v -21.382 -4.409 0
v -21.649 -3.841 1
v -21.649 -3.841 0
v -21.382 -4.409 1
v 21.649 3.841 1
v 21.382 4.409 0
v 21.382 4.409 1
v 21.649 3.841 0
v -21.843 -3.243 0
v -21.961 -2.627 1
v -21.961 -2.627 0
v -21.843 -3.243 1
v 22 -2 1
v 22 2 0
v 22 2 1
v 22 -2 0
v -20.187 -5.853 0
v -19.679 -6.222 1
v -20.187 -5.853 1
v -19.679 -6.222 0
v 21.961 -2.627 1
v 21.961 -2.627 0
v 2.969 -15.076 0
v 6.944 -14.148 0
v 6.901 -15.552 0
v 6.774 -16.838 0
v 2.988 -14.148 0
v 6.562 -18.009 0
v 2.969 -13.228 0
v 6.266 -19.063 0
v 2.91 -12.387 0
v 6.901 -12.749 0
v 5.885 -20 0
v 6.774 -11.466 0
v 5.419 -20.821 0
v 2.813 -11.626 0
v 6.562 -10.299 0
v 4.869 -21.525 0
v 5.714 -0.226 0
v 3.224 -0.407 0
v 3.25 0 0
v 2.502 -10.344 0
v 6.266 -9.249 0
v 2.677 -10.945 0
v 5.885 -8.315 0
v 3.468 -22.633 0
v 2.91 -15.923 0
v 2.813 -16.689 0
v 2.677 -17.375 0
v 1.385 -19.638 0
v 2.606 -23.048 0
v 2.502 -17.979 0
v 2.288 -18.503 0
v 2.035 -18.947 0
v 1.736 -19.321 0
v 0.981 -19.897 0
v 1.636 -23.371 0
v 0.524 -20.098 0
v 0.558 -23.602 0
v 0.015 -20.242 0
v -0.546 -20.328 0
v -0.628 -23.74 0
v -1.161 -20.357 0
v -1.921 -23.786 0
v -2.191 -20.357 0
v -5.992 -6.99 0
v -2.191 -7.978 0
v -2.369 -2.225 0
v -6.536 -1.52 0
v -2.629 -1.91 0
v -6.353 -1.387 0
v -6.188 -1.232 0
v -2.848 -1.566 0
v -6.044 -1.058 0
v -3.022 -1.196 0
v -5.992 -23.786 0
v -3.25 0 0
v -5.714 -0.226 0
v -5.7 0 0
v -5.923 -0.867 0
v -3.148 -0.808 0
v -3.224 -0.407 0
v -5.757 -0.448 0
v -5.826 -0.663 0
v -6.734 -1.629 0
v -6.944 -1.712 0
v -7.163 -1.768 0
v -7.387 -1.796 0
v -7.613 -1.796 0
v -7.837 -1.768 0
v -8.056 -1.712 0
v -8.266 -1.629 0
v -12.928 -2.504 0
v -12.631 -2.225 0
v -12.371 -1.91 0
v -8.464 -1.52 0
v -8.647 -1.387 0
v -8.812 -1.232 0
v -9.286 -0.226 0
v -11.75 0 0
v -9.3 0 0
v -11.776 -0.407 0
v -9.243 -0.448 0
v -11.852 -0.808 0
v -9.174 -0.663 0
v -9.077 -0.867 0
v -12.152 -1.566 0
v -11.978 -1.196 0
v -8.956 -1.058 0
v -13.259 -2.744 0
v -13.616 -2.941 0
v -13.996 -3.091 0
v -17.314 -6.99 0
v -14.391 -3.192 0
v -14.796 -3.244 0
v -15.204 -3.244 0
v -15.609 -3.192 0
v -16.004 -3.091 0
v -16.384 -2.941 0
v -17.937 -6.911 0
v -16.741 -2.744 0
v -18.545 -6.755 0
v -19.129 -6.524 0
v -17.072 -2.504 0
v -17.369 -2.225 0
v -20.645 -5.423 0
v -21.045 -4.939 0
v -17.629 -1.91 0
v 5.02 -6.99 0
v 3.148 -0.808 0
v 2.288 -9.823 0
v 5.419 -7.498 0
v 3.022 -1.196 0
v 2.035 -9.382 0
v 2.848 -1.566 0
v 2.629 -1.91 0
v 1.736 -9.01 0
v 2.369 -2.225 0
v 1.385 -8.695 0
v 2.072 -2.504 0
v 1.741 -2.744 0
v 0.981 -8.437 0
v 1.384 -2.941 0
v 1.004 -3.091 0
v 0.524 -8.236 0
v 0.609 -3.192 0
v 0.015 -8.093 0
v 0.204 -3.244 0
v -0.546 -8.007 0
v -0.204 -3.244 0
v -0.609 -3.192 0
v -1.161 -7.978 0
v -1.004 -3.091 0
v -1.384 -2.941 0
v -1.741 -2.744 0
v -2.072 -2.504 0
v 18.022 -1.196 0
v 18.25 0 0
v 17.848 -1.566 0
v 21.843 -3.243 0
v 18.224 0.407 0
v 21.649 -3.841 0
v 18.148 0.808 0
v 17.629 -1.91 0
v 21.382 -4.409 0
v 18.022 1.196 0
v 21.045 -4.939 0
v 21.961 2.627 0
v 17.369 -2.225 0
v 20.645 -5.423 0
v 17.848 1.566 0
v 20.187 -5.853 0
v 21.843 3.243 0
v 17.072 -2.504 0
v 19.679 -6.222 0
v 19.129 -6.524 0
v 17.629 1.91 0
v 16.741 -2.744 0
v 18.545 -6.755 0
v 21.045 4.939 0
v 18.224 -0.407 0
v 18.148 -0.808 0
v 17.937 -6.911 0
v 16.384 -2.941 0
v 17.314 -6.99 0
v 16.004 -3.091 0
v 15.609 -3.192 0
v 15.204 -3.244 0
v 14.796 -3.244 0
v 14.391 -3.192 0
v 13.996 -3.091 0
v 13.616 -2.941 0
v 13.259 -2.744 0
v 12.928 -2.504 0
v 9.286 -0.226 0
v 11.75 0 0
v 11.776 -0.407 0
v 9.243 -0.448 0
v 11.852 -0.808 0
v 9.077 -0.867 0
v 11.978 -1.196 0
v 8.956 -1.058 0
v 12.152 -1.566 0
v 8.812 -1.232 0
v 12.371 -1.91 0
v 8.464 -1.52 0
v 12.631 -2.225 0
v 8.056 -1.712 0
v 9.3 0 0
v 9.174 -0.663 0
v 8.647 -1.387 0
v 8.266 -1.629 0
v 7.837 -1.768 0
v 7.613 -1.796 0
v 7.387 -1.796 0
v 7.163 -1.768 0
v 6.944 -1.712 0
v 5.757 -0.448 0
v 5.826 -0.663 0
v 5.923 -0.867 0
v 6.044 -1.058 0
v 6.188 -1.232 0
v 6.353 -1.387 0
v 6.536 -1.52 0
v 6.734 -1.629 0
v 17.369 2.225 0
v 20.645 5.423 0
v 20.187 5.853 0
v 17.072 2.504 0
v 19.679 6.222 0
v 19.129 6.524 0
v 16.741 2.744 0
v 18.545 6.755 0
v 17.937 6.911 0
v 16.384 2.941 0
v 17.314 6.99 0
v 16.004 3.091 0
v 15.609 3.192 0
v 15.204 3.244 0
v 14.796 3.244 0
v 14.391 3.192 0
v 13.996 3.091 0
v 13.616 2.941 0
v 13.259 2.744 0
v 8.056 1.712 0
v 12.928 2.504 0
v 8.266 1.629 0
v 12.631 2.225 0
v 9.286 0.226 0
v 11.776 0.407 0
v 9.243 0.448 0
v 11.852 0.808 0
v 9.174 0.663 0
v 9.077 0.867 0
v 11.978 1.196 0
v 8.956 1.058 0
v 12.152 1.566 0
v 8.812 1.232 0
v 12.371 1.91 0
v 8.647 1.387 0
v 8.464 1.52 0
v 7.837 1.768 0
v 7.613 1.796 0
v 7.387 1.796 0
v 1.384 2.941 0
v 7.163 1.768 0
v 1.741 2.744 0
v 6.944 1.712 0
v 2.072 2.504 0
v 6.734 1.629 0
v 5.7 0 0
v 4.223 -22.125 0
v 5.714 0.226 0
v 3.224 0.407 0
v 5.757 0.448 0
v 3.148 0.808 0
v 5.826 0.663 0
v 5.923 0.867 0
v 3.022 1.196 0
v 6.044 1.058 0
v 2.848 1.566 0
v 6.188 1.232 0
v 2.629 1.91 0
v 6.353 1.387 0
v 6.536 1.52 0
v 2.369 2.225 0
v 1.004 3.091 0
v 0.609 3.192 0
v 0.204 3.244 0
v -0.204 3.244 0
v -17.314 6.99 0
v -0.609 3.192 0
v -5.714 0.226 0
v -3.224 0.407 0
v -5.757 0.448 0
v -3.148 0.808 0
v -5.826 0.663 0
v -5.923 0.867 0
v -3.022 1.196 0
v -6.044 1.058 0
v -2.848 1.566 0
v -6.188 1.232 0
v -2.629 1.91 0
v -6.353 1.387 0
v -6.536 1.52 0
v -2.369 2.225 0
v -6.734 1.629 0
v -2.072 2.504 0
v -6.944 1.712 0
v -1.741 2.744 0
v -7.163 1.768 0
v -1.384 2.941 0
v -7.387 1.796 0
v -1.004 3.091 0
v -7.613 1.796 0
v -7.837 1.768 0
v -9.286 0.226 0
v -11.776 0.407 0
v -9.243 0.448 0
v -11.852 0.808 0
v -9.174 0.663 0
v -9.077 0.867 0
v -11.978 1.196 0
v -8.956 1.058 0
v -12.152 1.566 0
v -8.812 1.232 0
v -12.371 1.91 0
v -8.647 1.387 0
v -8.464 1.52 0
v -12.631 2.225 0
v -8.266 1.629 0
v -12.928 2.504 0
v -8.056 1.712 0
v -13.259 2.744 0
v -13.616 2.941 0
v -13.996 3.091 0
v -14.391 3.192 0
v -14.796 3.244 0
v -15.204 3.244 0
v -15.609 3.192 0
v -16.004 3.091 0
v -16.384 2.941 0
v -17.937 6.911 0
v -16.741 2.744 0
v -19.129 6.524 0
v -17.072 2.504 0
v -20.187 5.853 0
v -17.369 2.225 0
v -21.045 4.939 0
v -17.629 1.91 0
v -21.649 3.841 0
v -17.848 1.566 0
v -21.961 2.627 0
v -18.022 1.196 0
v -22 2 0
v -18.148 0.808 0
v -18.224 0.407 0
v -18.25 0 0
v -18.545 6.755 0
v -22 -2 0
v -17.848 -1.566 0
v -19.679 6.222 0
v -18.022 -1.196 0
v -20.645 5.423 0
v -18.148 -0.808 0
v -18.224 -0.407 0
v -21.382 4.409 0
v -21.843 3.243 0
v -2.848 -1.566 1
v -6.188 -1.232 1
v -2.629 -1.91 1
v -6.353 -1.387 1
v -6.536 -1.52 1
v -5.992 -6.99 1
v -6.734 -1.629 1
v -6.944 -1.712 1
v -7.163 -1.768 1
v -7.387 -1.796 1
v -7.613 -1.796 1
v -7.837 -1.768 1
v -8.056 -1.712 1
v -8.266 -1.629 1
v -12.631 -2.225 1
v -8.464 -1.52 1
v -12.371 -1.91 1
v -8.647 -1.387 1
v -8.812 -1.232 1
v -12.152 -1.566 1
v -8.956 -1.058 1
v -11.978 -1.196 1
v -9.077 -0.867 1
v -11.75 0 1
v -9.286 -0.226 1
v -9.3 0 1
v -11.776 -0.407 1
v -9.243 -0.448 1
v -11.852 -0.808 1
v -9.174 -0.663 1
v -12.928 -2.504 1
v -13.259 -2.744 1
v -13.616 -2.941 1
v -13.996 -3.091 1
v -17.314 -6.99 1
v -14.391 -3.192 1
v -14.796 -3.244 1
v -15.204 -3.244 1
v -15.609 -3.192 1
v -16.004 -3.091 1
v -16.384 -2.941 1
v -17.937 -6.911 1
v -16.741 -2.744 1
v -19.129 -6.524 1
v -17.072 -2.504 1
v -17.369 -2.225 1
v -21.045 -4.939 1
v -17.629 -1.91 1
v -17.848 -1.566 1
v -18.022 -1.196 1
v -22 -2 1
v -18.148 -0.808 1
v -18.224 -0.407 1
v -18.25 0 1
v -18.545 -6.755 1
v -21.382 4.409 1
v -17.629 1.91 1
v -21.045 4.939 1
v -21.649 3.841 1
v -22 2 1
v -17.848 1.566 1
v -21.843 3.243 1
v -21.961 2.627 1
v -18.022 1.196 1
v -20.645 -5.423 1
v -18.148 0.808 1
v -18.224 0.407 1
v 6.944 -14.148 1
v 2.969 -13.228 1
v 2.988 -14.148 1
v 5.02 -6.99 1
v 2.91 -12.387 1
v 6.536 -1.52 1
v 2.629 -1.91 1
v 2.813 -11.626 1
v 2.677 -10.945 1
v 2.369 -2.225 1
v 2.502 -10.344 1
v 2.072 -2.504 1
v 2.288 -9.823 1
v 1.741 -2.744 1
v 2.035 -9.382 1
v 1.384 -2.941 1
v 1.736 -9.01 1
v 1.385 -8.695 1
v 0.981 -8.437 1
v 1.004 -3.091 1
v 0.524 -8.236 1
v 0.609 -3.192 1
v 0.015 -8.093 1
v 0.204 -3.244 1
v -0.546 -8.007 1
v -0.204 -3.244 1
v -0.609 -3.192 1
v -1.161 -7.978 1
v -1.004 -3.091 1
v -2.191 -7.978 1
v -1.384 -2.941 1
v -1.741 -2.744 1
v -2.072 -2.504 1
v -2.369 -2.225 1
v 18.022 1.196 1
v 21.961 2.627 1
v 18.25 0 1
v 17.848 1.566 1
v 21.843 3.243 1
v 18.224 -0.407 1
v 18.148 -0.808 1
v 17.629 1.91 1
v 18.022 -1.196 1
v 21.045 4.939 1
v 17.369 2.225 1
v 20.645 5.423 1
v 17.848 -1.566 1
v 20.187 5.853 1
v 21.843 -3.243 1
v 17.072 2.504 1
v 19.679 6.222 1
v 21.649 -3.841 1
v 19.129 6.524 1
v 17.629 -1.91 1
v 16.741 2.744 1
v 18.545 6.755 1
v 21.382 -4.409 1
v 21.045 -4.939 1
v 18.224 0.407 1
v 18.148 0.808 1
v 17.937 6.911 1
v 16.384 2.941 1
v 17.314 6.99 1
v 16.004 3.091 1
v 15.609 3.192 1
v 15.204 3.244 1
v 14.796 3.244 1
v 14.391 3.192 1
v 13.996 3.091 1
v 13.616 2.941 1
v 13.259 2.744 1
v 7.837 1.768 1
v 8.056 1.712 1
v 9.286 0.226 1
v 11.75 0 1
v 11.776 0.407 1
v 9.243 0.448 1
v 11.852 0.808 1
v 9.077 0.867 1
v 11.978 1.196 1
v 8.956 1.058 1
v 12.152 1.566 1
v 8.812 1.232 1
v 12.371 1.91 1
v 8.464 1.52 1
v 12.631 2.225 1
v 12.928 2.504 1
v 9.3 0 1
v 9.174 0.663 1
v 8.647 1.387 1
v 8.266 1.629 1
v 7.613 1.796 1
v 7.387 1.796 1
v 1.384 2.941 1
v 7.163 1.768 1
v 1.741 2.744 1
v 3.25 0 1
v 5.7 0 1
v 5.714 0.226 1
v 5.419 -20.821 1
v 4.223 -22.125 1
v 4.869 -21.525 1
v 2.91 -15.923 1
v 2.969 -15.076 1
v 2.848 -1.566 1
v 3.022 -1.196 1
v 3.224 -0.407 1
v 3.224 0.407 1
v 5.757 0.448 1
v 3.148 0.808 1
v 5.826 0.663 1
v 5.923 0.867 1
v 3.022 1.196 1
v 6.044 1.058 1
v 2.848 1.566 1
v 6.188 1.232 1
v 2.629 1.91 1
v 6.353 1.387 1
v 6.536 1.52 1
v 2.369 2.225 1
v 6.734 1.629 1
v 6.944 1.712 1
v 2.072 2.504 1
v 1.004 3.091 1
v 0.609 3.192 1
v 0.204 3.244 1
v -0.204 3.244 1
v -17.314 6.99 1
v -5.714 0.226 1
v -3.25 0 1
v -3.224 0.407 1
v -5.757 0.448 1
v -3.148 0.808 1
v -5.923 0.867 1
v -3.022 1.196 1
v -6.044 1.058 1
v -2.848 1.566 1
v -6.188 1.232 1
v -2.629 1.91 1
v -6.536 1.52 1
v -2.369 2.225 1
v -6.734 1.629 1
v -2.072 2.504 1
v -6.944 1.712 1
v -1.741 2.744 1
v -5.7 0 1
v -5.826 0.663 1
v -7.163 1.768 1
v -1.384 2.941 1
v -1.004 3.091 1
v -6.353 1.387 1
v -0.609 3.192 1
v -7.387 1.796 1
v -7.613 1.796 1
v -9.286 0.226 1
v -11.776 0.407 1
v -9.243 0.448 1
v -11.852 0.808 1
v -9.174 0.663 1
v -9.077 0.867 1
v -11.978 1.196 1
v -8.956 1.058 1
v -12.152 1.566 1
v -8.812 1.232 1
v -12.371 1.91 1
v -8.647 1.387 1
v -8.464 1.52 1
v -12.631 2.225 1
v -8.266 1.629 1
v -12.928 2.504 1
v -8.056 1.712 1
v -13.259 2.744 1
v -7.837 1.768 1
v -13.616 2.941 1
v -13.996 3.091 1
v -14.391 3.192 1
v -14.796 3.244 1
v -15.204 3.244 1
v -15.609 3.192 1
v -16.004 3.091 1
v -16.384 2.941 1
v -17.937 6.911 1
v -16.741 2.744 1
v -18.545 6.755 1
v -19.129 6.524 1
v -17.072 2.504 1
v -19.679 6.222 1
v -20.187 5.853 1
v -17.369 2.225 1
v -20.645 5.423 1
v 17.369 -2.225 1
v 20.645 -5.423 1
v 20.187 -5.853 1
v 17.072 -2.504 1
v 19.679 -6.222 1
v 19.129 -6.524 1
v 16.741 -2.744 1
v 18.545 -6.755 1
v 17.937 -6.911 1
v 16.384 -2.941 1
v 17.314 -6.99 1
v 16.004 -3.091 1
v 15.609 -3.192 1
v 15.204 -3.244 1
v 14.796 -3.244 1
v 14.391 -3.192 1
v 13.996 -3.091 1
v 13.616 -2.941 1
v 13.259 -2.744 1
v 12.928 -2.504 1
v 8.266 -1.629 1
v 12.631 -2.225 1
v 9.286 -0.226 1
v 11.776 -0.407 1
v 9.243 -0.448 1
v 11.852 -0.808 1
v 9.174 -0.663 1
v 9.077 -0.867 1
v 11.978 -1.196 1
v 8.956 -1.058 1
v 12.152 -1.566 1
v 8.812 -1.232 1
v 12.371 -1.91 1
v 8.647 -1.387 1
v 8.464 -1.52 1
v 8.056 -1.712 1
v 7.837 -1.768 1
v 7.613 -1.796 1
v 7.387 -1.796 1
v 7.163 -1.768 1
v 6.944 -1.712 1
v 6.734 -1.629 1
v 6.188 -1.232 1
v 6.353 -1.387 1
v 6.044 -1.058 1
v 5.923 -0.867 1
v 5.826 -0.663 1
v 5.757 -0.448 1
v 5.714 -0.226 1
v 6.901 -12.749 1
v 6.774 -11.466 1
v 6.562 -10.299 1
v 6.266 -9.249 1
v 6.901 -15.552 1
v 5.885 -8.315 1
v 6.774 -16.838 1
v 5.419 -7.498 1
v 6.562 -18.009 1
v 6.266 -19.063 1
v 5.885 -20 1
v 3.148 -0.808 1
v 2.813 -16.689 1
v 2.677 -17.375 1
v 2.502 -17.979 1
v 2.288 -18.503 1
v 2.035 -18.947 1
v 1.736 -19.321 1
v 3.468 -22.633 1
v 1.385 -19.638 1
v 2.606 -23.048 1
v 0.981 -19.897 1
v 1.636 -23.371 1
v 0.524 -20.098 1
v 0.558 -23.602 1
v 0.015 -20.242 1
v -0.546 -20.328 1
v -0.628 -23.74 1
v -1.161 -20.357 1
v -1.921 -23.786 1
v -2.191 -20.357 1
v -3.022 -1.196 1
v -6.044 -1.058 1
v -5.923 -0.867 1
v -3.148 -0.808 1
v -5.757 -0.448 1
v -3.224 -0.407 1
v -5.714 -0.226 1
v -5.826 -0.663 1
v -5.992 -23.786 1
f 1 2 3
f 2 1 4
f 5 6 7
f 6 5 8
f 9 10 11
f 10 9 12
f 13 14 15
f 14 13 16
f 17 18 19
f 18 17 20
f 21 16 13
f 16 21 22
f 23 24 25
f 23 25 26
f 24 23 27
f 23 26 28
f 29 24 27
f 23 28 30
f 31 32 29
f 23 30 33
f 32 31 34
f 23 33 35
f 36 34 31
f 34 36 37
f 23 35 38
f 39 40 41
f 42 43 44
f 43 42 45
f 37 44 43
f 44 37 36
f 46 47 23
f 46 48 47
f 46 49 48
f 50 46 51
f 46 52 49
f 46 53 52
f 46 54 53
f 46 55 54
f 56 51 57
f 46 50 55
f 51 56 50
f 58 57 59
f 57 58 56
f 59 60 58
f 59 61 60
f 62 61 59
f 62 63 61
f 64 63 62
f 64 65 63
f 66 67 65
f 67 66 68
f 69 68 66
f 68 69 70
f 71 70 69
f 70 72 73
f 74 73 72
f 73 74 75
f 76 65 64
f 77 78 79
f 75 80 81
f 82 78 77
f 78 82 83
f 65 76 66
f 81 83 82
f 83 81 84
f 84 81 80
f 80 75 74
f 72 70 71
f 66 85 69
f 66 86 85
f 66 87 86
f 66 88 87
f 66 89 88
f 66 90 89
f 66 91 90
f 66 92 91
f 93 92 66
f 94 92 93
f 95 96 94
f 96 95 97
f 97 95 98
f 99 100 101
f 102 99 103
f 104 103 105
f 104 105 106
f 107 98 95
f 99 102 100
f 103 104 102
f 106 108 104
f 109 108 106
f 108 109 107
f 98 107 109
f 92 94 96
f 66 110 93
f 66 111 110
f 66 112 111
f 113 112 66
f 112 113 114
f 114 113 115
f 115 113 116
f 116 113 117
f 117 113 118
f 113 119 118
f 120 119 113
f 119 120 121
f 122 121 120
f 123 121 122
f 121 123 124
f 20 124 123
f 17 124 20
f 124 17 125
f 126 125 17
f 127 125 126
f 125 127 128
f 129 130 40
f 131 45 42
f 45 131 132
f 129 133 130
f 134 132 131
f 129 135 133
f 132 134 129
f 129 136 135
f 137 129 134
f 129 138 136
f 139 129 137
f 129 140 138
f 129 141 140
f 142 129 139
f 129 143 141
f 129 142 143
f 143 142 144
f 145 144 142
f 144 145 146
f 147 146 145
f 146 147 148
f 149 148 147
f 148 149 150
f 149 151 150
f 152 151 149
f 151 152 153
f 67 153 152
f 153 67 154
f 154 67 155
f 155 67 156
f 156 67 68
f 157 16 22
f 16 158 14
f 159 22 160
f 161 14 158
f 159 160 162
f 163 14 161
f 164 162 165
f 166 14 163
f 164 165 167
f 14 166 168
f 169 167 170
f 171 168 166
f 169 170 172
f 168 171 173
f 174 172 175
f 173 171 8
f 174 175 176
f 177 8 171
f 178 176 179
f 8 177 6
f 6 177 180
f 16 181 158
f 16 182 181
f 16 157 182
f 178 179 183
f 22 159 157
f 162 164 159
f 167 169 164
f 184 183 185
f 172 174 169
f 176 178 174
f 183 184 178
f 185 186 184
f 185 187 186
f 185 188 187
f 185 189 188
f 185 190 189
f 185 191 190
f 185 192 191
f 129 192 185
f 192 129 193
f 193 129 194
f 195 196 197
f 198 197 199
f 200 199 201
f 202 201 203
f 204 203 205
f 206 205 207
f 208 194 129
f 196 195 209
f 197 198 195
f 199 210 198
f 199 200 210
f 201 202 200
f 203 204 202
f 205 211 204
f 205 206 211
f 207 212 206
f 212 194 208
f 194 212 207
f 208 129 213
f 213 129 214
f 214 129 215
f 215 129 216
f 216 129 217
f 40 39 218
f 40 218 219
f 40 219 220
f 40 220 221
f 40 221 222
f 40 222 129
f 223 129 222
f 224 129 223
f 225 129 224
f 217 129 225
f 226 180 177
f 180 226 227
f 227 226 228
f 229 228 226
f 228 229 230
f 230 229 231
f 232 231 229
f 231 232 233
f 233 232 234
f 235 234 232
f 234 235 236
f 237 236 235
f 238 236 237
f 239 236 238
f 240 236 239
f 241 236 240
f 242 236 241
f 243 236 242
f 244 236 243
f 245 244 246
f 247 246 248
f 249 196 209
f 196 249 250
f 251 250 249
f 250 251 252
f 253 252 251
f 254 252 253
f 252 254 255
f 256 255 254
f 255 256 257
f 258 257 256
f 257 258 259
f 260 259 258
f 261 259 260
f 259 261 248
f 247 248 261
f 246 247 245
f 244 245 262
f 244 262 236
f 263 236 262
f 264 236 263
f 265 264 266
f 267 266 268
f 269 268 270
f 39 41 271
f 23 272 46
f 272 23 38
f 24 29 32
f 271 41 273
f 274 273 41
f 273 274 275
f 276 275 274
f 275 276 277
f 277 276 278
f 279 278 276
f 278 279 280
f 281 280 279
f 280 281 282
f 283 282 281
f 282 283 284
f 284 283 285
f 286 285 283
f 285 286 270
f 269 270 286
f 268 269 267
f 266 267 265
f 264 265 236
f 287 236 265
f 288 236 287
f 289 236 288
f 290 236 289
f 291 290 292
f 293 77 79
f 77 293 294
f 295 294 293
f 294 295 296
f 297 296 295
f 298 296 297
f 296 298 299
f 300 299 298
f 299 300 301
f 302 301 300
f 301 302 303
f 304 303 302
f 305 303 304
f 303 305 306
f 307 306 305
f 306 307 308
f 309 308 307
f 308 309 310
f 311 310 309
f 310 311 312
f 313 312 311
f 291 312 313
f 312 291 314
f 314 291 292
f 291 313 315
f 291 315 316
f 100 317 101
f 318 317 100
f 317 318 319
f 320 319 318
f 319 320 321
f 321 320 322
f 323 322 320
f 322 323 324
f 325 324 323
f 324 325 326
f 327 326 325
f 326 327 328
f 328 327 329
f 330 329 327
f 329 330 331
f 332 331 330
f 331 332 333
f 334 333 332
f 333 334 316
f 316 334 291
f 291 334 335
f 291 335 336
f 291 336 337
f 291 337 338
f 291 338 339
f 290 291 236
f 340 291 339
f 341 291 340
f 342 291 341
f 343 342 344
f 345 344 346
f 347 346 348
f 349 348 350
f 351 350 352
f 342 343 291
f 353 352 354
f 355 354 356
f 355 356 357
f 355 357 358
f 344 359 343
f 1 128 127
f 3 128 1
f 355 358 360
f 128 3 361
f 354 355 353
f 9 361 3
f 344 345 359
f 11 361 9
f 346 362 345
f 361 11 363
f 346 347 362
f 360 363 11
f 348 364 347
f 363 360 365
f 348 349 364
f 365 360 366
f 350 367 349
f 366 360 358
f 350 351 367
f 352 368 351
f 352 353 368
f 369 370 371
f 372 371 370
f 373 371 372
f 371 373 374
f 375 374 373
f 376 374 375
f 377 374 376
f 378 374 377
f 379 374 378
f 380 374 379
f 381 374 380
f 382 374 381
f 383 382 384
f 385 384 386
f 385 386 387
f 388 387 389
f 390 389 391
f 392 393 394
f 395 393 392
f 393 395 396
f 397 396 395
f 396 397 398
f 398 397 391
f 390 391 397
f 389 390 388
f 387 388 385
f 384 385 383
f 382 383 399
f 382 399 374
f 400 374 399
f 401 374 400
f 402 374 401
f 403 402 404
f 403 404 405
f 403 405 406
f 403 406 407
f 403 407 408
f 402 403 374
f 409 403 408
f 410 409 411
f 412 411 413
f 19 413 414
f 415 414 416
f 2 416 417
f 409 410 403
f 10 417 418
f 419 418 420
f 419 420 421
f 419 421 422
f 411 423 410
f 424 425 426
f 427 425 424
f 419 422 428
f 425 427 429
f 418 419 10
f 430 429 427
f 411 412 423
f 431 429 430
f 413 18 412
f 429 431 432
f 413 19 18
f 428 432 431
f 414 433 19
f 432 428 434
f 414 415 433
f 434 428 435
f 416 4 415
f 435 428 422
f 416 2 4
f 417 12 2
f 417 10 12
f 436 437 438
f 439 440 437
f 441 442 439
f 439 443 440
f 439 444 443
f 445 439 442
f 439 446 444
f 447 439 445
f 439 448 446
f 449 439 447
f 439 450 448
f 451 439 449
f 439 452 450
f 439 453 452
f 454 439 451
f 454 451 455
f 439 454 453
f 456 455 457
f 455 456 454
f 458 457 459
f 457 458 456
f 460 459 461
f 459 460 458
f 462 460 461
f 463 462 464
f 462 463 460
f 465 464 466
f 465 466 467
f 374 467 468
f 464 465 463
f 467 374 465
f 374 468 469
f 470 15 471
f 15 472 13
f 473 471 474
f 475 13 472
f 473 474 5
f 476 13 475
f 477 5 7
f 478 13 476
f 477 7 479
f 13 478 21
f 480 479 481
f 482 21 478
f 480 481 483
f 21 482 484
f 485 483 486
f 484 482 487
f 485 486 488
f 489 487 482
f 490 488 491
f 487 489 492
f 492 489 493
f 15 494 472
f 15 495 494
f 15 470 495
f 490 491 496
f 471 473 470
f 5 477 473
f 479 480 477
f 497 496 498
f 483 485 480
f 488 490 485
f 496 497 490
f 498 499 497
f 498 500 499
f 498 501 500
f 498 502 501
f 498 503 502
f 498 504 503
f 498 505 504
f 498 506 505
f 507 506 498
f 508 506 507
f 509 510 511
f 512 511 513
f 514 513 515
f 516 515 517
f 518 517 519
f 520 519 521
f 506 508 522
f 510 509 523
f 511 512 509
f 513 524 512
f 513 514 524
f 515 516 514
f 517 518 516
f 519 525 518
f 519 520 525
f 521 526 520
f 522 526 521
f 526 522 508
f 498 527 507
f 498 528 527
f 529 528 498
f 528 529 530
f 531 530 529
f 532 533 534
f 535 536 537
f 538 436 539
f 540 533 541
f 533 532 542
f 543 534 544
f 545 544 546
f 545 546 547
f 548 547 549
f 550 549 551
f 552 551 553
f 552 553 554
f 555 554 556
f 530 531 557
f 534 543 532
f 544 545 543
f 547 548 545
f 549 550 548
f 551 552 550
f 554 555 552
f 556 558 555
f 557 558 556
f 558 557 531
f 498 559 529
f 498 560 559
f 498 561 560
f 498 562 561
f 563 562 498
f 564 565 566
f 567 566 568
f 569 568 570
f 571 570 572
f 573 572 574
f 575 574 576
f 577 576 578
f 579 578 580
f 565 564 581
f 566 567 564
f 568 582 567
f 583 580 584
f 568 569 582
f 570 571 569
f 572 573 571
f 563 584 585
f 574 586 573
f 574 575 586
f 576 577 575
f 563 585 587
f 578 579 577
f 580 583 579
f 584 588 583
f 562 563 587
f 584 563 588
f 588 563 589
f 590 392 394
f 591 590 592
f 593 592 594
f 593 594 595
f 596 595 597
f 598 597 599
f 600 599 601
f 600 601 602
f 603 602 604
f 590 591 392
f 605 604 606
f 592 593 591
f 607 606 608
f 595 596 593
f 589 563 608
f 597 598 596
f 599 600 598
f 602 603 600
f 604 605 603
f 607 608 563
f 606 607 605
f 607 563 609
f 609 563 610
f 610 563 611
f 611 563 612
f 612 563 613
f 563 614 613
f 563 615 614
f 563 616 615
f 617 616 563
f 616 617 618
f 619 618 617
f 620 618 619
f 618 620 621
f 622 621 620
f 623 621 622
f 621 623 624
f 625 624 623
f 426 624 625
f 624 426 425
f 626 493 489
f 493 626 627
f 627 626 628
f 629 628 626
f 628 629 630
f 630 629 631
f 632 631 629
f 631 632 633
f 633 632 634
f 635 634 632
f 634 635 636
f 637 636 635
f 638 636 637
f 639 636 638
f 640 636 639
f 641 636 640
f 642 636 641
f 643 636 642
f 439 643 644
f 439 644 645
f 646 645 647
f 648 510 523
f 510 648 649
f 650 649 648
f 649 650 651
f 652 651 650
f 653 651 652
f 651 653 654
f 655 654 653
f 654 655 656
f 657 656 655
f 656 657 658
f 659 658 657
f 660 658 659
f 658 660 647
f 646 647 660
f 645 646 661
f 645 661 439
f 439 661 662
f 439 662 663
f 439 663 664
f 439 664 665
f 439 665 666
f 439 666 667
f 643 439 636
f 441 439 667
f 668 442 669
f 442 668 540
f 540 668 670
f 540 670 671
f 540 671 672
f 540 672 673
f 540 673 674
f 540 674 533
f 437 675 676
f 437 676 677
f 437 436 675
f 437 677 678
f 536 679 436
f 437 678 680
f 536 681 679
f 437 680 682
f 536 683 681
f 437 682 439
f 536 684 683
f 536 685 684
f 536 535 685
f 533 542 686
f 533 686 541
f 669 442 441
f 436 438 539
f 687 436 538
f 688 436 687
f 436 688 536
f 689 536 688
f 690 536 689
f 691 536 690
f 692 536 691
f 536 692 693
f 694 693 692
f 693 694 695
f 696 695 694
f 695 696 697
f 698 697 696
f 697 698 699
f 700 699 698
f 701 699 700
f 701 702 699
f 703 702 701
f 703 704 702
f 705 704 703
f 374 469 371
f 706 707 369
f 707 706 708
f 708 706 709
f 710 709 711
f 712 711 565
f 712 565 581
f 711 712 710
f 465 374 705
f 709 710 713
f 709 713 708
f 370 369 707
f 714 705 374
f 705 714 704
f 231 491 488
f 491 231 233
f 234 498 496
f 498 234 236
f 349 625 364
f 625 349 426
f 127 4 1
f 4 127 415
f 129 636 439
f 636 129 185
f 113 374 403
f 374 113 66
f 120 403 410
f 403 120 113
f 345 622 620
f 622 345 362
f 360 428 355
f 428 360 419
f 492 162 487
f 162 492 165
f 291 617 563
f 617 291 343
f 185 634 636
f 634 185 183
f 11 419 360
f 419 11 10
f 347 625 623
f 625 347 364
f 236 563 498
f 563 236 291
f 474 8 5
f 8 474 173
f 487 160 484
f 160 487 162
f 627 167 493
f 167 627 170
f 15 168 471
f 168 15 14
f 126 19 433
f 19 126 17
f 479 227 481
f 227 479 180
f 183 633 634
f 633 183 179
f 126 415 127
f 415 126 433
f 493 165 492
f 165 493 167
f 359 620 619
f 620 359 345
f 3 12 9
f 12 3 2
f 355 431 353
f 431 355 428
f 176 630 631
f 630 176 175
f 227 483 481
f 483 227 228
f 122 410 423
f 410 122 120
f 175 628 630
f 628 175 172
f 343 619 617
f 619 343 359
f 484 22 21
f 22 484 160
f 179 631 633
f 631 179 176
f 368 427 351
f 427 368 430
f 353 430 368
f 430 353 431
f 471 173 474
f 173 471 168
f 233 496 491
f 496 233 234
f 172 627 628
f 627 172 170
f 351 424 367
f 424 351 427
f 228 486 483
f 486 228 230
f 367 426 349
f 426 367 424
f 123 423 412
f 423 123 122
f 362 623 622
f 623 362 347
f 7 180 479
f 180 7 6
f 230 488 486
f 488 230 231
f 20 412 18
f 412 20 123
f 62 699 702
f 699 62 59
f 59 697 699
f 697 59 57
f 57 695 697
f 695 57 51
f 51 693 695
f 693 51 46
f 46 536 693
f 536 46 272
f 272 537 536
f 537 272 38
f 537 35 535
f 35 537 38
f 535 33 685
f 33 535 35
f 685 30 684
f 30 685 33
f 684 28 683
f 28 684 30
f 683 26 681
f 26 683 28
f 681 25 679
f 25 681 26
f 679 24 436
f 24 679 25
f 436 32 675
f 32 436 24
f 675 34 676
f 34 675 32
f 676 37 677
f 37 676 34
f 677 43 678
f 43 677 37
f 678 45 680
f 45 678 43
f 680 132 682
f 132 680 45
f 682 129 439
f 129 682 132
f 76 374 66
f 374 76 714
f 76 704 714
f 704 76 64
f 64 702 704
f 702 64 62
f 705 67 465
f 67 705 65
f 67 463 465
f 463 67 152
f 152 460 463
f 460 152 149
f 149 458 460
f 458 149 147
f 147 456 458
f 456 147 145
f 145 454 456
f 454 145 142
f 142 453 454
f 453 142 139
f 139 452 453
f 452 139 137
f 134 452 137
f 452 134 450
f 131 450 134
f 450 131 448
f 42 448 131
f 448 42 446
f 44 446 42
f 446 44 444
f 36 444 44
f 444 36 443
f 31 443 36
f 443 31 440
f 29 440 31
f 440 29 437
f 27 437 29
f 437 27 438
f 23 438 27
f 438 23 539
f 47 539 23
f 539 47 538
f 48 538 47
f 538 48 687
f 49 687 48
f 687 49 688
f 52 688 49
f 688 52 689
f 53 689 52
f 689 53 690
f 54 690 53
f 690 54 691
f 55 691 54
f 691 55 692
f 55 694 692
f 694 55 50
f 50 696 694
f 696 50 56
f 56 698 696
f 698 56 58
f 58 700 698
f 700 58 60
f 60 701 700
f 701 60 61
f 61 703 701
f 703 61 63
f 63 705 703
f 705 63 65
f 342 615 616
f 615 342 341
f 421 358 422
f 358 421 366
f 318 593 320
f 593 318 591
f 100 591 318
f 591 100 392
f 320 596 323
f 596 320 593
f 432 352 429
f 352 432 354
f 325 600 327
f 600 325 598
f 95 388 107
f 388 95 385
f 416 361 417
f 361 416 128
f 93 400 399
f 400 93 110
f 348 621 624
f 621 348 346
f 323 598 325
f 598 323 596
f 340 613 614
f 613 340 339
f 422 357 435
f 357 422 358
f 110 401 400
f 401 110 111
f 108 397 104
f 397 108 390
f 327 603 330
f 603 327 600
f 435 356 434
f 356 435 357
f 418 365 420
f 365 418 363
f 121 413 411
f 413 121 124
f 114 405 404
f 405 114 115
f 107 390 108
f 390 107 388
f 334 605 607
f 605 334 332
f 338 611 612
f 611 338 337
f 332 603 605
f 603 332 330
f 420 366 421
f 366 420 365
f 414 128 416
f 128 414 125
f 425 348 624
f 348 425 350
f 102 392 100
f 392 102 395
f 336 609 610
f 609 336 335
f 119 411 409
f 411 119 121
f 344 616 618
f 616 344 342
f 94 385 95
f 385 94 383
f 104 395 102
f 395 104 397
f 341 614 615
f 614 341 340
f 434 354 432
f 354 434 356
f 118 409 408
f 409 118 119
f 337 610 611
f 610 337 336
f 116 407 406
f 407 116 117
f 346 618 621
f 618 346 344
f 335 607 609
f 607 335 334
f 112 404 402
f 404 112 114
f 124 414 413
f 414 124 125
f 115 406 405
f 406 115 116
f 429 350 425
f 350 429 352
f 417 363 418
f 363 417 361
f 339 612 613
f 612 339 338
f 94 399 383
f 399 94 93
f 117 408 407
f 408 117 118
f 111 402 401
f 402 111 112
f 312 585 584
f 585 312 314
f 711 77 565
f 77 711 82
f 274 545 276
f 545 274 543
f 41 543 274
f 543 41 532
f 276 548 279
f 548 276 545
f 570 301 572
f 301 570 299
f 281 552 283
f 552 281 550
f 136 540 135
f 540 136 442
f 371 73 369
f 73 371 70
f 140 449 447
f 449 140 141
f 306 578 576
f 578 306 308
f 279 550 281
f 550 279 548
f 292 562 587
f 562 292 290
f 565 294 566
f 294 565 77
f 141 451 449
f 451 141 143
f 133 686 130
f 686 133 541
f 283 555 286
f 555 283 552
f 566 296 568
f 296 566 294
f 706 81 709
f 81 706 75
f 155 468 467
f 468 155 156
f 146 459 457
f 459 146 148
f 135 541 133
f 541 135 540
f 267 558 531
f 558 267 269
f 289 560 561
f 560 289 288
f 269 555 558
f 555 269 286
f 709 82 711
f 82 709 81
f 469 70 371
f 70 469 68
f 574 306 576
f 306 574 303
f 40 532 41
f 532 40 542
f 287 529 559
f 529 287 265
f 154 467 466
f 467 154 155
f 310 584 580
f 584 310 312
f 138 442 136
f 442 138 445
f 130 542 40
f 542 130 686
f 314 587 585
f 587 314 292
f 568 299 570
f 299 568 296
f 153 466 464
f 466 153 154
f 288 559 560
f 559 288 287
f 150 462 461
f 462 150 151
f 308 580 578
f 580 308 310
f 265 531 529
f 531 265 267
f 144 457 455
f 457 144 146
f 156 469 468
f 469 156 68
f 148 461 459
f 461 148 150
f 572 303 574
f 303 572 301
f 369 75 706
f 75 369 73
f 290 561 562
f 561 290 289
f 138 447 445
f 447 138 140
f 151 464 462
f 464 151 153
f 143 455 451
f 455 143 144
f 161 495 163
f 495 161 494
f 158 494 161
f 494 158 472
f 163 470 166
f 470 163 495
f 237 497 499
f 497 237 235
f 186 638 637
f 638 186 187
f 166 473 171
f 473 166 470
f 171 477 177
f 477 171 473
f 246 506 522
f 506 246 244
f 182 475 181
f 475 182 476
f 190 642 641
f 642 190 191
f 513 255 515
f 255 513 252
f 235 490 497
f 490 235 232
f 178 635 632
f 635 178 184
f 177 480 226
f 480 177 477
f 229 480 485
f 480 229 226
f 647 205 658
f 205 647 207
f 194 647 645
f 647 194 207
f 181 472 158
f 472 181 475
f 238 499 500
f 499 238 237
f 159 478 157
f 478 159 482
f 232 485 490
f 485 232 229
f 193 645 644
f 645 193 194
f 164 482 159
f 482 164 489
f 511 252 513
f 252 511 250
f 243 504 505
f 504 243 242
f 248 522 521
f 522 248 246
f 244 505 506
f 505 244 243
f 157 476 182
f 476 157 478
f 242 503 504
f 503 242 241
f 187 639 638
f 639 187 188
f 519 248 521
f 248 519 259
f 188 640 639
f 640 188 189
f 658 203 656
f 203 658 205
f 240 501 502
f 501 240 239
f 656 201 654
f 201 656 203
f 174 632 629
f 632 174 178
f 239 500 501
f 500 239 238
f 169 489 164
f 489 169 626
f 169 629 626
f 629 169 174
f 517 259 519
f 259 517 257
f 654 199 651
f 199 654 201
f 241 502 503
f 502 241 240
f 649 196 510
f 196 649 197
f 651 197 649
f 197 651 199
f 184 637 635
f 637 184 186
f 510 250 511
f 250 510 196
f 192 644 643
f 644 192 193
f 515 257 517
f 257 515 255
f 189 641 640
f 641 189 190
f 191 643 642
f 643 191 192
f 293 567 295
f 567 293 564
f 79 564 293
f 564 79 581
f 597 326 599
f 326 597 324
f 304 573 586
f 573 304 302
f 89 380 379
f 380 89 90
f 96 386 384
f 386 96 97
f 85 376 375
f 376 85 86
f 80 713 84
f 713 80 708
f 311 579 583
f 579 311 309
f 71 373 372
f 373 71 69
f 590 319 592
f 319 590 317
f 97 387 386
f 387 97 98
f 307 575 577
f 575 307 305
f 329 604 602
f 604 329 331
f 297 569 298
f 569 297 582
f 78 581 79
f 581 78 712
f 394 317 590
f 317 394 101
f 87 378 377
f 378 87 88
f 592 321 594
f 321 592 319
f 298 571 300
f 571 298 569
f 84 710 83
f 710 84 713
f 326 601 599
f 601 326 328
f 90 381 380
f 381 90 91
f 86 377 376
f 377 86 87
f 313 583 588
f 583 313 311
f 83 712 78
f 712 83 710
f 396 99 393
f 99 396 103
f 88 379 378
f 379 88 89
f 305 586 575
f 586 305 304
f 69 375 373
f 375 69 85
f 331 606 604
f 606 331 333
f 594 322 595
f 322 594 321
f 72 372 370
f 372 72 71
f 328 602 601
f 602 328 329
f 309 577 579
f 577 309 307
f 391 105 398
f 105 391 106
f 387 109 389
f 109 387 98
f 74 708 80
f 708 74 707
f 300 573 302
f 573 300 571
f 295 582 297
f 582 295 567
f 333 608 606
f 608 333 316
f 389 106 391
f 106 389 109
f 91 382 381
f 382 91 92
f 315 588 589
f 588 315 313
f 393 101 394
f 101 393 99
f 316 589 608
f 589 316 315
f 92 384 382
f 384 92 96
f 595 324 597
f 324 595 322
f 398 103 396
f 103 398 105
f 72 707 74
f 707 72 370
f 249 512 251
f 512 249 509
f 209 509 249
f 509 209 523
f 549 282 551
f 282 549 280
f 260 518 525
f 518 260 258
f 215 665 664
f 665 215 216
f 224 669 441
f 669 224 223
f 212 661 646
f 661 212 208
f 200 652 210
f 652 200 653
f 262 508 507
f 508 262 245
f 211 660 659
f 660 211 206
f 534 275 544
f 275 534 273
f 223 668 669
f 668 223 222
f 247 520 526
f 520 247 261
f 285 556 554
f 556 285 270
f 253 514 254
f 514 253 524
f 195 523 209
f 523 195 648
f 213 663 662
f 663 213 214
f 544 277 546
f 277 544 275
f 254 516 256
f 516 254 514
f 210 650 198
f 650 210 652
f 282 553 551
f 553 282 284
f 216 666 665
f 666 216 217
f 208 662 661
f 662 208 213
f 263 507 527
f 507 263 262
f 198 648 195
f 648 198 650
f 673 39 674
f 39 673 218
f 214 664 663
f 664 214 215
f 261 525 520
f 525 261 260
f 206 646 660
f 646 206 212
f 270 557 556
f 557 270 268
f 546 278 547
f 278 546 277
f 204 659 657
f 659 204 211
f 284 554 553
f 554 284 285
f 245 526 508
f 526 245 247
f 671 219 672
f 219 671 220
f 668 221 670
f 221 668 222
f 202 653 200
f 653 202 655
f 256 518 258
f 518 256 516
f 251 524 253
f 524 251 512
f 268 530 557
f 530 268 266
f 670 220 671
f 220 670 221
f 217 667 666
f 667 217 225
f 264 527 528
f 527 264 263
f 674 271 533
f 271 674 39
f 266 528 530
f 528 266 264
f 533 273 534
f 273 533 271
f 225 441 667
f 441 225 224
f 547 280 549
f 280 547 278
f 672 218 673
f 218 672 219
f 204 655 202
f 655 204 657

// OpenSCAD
$fn = 50;


difference() {
	union() {
		hull() {
			translate(v = [-17.0000000000, 2.0000000000, 0]) {
				cylinder(h = 1, r = 5);
			}
			translate(v = [17.0000000000, 2.0000000000, 0]) {
				cylinder(h = 1, r = 5);
			}
			translate(v = [-17.0000000000, -2.0000000000, 0]) {
				cylinder(h = 1, r = 5);
			}
			translate(v = [17.0000000000, -2.0000000000, 0]) {
				cylinder(h = 1, r = 5);
			}
		}
		translate(v = [0, -5, 0]) {
			linear_extrude(height = 1) {
				text(font = "DejaVu Sans Mono:style=Bold", halign = "center", size = 19.0000000000, text = "D", valign = "top");
			}
		}
	}
	union() {
		translate(v = [-15.0000000000, 0.0000000000, 0]) {
			translate(v = [0, 0, -100]) {
				cylinder(h = 200, r = 3.2500000000);
			}
		}
		translate(v = [0, 0, -100]) {
			cylinder(h = 200, r = 3.2500000000);
		}
		translate(v = [15.0000000000, 0.0000000000, 0]) {
			translate(v = [0, 0, -100]) {
				cylinder(h = 200, r = 3.2500000000);
			}
		}
		translate(v = [-15.0000000000, 0.0000000000, 0]) {
			translate(v = [0, 0, -100]) {
				cylinder(h = 200, r = 1.8000000000);
			}
		}
		translate(v = [-7.5000000000, 0.0000000000, 0]) {
			translate(v = [0, 0, -100]) {
				cylinder(h = 200, r = 1.8000000000);
			}
		}
		translate(v = [0, 0, -100]) {
			cylinder(h = 200, r = 1.8000000000);
		}
		translate(v = [7.5000000000, 0.0000000000, 0]) {
			translate(v = [0, 0, -100]) {
				cylinder(h = 200, r = 1.8000000000);
			}
		}
		translate(v = [15.0000000000, 0.0000000000, 0]) {
			translate(v = [0, 0, -100]) {
				cylinder(h = 200, r = 1.8000000000);
			}
		}
	}
}
